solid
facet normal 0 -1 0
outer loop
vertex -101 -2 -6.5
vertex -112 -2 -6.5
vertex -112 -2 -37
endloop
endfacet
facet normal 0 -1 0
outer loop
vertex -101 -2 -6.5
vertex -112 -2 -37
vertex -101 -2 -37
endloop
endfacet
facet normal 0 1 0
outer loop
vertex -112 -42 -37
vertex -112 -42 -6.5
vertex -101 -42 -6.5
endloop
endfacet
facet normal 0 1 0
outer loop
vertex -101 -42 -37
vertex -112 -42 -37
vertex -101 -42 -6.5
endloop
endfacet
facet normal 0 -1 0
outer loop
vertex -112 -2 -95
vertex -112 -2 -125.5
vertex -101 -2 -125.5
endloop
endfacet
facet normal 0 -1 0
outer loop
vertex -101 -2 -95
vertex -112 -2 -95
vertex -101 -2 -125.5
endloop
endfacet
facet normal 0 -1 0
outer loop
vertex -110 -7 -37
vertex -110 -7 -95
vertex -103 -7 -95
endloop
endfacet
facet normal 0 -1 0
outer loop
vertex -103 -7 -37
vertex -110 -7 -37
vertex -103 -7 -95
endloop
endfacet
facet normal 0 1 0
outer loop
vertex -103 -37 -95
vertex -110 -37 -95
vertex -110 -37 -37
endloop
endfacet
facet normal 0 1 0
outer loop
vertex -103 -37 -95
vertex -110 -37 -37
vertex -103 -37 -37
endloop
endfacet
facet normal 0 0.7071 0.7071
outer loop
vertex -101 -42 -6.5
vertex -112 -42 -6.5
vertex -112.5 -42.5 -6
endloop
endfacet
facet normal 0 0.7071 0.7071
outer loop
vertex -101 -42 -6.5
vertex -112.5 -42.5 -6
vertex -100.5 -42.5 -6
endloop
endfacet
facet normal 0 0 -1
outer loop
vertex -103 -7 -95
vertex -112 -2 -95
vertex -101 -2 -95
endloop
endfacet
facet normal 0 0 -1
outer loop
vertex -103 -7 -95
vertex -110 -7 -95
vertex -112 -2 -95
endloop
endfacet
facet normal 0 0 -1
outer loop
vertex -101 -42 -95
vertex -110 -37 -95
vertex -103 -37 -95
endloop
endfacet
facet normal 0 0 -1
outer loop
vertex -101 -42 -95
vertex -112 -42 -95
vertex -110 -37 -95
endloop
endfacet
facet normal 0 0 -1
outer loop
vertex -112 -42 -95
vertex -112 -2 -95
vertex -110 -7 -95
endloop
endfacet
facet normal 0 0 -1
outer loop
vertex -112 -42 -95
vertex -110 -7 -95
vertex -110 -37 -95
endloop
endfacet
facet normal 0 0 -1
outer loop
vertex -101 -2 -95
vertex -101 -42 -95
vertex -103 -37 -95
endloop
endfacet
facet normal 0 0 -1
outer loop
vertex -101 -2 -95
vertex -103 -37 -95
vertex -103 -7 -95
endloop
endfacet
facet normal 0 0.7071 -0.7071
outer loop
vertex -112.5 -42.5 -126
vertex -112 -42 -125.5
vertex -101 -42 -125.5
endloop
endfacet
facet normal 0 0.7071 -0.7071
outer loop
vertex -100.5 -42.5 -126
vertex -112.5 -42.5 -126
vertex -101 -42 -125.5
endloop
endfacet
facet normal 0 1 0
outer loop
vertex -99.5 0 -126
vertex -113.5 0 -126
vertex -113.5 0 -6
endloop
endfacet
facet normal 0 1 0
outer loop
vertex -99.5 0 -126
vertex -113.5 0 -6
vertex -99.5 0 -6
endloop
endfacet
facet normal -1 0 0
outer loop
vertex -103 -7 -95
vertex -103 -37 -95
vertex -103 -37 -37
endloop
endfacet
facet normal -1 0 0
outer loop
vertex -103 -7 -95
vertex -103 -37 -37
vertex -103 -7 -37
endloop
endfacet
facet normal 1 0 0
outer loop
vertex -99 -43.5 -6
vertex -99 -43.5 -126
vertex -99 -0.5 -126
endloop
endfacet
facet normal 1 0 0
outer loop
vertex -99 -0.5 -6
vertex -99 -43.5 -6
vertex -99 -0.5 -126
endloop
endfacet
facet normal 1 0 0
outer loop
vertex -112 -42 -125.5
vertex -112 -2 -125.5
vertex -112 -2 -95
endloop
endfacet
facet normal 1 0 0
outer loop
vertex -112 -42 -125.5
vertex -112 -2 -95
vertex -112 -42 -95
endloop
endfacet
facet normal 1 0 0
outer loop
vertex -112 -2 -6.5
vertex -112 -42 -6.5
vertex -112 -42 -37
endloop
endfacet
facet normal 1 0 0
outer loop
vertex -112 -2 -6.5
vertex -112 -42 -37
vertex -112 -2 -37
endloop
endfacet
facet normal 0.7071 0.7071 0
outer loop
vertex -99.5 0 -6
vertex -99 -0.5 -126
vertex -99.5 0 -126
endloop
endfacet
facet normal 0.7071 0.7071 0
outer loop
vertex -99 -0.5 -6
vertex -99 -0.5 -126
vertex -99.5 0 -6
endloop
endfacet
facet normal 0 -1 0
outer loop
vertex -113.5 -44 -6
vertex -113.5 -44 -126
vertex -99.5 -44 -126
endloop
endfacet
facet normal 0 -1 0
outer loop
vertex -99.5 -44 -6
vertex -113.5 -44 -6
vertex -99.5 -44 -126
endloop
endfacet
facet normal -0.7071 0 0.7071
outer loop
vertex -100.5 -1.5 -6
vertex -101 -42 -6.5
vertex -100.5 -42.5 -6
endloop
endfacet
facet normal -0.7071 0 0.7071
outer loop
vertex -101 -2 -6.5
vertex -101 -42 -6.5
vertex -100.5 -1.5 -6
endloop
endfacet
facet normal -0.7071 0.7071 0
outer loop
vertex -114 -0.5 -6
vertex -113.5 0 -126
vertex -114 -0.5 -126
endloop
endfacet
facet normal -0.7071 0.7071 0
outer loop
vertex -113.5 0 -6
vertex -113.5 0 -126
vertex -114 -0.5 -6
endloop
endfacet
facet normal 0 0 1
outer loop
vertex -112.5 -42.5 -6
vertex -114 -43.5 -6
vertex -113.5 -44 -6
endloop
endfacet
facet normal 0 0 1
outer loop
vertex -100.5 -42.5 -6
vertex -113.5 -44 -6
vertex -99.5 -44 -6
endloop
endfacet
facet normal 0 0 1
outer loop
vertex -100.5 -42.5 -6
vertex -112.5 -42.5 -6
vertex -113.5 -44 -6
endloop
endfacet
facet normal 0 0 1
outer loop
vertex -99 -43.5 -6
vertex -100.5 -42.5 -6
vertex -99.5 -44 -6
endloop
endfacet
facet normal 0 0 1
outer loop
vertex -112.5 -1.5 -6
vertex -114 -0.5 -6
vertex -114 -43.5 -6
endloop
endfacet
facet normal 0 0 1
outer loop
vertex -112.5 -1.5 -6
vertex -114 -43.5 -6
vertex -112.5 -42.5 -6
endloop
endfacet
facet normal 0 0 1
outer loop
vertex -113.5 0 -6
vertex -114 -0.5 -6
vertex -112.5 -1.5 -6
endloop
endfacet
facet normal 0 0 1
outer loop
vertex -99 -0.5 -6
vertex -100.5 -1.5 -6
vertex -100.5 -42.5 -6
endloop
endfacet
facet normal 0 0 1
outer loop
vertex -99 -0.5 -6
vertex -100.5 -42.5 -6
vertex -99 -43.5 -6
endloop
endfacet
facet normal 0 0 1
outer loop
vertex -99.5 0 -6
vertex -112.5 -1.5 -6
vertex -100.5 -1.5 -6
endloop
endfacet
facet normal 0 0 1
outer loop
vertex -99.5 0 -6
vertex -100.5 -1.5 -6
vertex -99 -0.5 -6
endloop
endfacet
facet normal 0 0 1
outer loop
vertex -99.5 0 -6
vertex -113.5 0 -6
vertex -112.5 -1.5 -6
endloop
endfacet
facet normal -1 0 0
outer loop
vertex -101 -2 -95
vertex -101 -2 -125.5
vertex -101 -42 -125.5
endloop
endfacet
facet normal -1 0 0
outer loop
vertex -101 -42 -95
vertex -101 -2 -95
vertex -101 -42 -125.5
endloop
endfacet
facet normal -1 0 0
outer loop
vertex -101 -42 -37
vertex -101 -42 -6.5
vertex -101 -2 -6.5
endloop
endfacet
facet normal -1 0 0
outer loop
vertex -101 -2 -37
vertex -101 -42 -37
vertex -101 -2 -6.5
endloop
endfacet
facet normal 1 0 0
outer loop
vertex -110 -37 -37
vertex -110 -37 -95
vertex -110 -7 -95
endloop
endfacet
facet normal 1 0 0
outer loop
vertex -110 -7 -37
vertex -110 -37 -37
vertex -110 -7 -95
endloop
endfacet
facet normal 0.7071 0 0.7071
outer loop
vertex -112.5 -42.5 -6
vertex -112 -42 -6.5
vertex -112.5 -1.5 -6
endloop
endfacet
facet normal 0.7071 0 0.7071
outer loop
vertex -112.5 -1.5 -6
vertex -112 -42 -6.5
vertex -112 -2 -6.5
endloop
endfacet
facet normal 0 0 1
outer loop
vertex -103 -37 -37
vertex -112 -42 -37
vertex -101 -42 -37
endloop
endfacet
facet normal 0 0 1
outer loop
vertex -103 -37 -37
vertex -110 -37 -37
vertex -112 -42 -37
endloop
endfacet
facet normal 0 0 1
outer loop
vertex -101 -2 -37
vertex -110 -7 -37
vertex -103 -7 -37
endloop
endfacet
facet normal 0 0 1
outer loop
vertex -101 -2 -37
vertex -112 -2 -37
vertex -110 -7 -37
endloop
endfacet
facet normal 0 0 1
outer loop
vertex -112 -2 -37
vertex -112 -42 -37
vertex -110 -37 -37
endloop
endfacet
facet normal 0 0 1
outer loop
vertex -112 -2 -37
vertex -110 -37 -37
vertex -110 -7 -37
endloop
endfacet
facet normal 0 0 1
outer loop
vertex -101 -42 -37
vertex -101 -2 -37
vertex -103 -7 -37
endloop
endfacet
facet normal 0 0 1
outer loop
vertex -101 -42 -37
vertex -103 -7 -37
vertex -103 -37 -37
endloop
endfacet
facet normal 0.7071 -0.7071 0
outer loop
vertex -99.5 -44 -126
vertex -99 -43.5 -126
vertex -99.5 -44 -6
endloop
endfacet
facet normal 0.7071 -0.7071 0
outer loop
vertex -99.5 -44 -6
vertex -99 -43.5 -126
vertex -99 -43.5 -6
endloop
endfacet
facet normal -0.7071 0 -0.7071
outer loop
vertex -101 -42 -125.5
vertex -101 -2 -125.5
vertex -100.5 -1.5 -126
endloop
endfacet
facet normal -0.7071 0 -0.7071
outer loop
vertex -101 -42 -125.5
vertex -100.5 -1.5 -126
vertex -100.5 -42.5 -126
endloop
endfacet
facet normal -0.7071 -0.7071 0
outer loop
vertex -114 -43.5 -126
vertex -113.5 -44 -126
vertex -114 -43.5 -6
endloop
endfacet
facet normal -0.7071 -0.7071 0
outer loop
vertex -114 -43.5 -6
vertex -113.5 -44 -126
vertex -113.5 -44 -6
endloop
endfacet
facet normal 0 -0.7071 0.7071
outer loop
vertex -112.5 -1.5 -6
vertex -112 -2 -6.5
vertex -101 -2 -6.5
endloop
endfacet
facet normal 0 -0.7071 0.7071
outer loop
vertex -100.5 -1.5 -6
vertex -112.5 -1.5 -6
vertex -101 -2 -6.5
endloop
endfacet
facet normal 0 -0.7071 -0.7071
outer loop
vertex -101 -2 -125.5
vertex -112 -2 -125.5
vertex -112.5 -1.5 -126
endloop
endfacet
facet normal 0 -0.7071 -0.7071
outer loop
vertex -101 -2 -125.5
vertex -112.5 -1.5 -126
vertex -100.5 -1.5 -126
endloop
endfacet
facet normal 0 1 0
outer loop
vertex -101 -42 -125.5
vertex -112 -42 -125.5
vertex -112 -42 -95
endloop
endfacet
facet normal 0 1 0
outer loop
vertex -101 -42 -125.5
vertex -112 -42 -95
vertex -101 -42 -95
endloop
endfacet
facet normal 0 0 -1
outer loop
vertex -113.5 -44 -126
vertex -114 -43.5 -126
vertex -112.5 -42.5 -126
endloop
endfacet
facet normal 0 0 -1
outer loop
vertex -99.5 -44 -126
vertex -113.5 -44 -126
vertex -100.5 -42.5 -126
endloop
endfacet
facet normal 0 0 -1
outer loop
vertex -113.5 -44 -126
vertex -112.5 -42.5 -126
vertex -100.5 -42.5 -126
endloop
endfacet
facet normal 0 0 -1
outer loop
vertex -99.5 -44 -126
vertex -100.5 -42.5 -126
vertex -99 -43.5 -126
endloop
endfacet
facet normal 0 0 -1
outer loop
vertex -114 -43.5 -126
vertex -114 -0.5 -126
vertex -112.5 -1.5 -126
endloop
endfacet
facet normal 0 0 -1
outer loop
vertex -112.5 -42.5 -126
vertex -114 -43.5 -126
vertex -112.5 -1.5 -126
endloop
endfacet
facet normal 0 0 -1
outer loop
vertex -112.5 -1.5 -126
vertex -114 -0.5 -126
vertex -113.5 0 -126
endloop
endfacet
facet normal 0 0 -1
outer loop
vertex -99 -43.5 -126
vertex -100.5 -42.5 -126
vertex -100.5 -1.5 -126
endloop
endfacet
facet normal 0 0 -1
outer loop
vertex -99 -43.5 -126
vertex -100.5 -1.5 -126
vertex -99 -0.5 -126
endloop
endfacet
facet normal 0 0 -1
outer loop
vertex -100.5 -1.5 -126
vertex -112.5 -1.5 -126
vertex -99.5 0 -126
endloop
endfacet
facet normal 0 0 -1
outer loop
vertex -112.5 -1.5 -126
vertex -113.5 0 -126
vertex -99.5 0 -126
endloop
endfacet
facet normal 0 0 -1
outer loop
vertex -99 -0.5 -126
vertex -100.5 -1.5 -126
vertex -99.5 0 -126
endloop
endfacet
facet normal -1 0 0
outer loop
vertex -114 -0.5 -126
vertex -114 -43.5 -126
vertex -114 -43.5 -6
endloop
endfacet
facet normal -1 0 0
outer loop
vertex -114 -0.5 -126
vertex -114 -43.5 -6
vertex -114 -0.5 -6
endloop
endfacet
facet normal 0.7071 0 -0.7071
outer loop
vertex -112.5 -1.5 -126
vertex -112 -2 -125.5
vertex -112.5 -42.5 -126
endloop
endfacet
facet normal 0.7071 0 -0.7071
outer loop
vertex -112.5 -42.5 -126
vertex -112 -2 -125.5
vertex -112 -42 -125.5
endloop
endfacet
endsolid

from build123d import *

# Parameters (mm, degrees)
SKETCH117_W     = 15
SKETCH117_H     = 44
SKETCH117_W_2   = 7
SKETCH117_H_2   = 30
PAD063_DEPTH    = 120
SKETCH118_W     = 11
SKETCH118_H     = 40
POCKET044_DEPTH = 31
SKETCH119_W     = 11
SKETCH119_H     = 40
POCKET045_DEPTH = 31
CHAMFER061_SIZE = 0.5
CHAMFER062_SIZE = 0.5


with BuildPart() as part:
    # Sketch117 → Pad063 (new body)
    with BuildSketch(Plane.XY):
        Rectangle(SKETCH117_W, SKETCH117_H)
        Rectangle(SKETCH117_W_2, SKETCH117_H_2, mode=Mode.SUBTRACT)
    extrude(amount=PAD063_DEPTH)

    # Sketch118 (on Face9 of Pad063) → Pocket044 (cut)
    with BuildSketch(Plane(origin=(0, 0, 0), x_dir=(1, 0, 0), z_dir=(0, 0, -1))):
        Rectangle(SKETCH118_W, SKETCH118_H)
    extrude(amount=-POCKET044_DEPTH, mode=Mode.SUBTRACT)

    # Sketch119 (on Face5 of Pocket044) → Pocket045 (cut)
    with BuildSketch(Plane.XY.offset(120)):
        Rectangle(SKETCH119_W, SKETCH119_H)
    extrude(amount=-POCKET045_DEPTH, mode=Mode.SUBTRACT)

    # Chamfer061
    chamfer061_edges = [part.edges().sort_by_distance(p)[0] for p in [
        (7.5, -22, 60),
        (-7.5, -22, 60),
        (-7.5, 22, 60),
        (7.5, 22, 60),
    ]]
    chamfer(chamfer061_edges, length=CHAMFER061_SIZE)

    # Chamfer062
    chamfer062_edges = [part.edges().sort_by_distance(p)[0] for p in [
        (-5.5, 0, 120),
        (0, -20, 120),
        (5.5, 0, 120),
        (0, 20, 120),
        (-5.5, 0, 0),
        (5.5, 0, 0),
        (0, -20, 0),
        (0, 20, 0),
    ]]
    chamfer(chamfer062_edges, length=CHAMFER062_SIZE)


with BuildPart() as part_1:
    # Body022 placement: moved
    add(part.part.moved(Location((-106.5, -22, -126))))


solid = part_1.part
